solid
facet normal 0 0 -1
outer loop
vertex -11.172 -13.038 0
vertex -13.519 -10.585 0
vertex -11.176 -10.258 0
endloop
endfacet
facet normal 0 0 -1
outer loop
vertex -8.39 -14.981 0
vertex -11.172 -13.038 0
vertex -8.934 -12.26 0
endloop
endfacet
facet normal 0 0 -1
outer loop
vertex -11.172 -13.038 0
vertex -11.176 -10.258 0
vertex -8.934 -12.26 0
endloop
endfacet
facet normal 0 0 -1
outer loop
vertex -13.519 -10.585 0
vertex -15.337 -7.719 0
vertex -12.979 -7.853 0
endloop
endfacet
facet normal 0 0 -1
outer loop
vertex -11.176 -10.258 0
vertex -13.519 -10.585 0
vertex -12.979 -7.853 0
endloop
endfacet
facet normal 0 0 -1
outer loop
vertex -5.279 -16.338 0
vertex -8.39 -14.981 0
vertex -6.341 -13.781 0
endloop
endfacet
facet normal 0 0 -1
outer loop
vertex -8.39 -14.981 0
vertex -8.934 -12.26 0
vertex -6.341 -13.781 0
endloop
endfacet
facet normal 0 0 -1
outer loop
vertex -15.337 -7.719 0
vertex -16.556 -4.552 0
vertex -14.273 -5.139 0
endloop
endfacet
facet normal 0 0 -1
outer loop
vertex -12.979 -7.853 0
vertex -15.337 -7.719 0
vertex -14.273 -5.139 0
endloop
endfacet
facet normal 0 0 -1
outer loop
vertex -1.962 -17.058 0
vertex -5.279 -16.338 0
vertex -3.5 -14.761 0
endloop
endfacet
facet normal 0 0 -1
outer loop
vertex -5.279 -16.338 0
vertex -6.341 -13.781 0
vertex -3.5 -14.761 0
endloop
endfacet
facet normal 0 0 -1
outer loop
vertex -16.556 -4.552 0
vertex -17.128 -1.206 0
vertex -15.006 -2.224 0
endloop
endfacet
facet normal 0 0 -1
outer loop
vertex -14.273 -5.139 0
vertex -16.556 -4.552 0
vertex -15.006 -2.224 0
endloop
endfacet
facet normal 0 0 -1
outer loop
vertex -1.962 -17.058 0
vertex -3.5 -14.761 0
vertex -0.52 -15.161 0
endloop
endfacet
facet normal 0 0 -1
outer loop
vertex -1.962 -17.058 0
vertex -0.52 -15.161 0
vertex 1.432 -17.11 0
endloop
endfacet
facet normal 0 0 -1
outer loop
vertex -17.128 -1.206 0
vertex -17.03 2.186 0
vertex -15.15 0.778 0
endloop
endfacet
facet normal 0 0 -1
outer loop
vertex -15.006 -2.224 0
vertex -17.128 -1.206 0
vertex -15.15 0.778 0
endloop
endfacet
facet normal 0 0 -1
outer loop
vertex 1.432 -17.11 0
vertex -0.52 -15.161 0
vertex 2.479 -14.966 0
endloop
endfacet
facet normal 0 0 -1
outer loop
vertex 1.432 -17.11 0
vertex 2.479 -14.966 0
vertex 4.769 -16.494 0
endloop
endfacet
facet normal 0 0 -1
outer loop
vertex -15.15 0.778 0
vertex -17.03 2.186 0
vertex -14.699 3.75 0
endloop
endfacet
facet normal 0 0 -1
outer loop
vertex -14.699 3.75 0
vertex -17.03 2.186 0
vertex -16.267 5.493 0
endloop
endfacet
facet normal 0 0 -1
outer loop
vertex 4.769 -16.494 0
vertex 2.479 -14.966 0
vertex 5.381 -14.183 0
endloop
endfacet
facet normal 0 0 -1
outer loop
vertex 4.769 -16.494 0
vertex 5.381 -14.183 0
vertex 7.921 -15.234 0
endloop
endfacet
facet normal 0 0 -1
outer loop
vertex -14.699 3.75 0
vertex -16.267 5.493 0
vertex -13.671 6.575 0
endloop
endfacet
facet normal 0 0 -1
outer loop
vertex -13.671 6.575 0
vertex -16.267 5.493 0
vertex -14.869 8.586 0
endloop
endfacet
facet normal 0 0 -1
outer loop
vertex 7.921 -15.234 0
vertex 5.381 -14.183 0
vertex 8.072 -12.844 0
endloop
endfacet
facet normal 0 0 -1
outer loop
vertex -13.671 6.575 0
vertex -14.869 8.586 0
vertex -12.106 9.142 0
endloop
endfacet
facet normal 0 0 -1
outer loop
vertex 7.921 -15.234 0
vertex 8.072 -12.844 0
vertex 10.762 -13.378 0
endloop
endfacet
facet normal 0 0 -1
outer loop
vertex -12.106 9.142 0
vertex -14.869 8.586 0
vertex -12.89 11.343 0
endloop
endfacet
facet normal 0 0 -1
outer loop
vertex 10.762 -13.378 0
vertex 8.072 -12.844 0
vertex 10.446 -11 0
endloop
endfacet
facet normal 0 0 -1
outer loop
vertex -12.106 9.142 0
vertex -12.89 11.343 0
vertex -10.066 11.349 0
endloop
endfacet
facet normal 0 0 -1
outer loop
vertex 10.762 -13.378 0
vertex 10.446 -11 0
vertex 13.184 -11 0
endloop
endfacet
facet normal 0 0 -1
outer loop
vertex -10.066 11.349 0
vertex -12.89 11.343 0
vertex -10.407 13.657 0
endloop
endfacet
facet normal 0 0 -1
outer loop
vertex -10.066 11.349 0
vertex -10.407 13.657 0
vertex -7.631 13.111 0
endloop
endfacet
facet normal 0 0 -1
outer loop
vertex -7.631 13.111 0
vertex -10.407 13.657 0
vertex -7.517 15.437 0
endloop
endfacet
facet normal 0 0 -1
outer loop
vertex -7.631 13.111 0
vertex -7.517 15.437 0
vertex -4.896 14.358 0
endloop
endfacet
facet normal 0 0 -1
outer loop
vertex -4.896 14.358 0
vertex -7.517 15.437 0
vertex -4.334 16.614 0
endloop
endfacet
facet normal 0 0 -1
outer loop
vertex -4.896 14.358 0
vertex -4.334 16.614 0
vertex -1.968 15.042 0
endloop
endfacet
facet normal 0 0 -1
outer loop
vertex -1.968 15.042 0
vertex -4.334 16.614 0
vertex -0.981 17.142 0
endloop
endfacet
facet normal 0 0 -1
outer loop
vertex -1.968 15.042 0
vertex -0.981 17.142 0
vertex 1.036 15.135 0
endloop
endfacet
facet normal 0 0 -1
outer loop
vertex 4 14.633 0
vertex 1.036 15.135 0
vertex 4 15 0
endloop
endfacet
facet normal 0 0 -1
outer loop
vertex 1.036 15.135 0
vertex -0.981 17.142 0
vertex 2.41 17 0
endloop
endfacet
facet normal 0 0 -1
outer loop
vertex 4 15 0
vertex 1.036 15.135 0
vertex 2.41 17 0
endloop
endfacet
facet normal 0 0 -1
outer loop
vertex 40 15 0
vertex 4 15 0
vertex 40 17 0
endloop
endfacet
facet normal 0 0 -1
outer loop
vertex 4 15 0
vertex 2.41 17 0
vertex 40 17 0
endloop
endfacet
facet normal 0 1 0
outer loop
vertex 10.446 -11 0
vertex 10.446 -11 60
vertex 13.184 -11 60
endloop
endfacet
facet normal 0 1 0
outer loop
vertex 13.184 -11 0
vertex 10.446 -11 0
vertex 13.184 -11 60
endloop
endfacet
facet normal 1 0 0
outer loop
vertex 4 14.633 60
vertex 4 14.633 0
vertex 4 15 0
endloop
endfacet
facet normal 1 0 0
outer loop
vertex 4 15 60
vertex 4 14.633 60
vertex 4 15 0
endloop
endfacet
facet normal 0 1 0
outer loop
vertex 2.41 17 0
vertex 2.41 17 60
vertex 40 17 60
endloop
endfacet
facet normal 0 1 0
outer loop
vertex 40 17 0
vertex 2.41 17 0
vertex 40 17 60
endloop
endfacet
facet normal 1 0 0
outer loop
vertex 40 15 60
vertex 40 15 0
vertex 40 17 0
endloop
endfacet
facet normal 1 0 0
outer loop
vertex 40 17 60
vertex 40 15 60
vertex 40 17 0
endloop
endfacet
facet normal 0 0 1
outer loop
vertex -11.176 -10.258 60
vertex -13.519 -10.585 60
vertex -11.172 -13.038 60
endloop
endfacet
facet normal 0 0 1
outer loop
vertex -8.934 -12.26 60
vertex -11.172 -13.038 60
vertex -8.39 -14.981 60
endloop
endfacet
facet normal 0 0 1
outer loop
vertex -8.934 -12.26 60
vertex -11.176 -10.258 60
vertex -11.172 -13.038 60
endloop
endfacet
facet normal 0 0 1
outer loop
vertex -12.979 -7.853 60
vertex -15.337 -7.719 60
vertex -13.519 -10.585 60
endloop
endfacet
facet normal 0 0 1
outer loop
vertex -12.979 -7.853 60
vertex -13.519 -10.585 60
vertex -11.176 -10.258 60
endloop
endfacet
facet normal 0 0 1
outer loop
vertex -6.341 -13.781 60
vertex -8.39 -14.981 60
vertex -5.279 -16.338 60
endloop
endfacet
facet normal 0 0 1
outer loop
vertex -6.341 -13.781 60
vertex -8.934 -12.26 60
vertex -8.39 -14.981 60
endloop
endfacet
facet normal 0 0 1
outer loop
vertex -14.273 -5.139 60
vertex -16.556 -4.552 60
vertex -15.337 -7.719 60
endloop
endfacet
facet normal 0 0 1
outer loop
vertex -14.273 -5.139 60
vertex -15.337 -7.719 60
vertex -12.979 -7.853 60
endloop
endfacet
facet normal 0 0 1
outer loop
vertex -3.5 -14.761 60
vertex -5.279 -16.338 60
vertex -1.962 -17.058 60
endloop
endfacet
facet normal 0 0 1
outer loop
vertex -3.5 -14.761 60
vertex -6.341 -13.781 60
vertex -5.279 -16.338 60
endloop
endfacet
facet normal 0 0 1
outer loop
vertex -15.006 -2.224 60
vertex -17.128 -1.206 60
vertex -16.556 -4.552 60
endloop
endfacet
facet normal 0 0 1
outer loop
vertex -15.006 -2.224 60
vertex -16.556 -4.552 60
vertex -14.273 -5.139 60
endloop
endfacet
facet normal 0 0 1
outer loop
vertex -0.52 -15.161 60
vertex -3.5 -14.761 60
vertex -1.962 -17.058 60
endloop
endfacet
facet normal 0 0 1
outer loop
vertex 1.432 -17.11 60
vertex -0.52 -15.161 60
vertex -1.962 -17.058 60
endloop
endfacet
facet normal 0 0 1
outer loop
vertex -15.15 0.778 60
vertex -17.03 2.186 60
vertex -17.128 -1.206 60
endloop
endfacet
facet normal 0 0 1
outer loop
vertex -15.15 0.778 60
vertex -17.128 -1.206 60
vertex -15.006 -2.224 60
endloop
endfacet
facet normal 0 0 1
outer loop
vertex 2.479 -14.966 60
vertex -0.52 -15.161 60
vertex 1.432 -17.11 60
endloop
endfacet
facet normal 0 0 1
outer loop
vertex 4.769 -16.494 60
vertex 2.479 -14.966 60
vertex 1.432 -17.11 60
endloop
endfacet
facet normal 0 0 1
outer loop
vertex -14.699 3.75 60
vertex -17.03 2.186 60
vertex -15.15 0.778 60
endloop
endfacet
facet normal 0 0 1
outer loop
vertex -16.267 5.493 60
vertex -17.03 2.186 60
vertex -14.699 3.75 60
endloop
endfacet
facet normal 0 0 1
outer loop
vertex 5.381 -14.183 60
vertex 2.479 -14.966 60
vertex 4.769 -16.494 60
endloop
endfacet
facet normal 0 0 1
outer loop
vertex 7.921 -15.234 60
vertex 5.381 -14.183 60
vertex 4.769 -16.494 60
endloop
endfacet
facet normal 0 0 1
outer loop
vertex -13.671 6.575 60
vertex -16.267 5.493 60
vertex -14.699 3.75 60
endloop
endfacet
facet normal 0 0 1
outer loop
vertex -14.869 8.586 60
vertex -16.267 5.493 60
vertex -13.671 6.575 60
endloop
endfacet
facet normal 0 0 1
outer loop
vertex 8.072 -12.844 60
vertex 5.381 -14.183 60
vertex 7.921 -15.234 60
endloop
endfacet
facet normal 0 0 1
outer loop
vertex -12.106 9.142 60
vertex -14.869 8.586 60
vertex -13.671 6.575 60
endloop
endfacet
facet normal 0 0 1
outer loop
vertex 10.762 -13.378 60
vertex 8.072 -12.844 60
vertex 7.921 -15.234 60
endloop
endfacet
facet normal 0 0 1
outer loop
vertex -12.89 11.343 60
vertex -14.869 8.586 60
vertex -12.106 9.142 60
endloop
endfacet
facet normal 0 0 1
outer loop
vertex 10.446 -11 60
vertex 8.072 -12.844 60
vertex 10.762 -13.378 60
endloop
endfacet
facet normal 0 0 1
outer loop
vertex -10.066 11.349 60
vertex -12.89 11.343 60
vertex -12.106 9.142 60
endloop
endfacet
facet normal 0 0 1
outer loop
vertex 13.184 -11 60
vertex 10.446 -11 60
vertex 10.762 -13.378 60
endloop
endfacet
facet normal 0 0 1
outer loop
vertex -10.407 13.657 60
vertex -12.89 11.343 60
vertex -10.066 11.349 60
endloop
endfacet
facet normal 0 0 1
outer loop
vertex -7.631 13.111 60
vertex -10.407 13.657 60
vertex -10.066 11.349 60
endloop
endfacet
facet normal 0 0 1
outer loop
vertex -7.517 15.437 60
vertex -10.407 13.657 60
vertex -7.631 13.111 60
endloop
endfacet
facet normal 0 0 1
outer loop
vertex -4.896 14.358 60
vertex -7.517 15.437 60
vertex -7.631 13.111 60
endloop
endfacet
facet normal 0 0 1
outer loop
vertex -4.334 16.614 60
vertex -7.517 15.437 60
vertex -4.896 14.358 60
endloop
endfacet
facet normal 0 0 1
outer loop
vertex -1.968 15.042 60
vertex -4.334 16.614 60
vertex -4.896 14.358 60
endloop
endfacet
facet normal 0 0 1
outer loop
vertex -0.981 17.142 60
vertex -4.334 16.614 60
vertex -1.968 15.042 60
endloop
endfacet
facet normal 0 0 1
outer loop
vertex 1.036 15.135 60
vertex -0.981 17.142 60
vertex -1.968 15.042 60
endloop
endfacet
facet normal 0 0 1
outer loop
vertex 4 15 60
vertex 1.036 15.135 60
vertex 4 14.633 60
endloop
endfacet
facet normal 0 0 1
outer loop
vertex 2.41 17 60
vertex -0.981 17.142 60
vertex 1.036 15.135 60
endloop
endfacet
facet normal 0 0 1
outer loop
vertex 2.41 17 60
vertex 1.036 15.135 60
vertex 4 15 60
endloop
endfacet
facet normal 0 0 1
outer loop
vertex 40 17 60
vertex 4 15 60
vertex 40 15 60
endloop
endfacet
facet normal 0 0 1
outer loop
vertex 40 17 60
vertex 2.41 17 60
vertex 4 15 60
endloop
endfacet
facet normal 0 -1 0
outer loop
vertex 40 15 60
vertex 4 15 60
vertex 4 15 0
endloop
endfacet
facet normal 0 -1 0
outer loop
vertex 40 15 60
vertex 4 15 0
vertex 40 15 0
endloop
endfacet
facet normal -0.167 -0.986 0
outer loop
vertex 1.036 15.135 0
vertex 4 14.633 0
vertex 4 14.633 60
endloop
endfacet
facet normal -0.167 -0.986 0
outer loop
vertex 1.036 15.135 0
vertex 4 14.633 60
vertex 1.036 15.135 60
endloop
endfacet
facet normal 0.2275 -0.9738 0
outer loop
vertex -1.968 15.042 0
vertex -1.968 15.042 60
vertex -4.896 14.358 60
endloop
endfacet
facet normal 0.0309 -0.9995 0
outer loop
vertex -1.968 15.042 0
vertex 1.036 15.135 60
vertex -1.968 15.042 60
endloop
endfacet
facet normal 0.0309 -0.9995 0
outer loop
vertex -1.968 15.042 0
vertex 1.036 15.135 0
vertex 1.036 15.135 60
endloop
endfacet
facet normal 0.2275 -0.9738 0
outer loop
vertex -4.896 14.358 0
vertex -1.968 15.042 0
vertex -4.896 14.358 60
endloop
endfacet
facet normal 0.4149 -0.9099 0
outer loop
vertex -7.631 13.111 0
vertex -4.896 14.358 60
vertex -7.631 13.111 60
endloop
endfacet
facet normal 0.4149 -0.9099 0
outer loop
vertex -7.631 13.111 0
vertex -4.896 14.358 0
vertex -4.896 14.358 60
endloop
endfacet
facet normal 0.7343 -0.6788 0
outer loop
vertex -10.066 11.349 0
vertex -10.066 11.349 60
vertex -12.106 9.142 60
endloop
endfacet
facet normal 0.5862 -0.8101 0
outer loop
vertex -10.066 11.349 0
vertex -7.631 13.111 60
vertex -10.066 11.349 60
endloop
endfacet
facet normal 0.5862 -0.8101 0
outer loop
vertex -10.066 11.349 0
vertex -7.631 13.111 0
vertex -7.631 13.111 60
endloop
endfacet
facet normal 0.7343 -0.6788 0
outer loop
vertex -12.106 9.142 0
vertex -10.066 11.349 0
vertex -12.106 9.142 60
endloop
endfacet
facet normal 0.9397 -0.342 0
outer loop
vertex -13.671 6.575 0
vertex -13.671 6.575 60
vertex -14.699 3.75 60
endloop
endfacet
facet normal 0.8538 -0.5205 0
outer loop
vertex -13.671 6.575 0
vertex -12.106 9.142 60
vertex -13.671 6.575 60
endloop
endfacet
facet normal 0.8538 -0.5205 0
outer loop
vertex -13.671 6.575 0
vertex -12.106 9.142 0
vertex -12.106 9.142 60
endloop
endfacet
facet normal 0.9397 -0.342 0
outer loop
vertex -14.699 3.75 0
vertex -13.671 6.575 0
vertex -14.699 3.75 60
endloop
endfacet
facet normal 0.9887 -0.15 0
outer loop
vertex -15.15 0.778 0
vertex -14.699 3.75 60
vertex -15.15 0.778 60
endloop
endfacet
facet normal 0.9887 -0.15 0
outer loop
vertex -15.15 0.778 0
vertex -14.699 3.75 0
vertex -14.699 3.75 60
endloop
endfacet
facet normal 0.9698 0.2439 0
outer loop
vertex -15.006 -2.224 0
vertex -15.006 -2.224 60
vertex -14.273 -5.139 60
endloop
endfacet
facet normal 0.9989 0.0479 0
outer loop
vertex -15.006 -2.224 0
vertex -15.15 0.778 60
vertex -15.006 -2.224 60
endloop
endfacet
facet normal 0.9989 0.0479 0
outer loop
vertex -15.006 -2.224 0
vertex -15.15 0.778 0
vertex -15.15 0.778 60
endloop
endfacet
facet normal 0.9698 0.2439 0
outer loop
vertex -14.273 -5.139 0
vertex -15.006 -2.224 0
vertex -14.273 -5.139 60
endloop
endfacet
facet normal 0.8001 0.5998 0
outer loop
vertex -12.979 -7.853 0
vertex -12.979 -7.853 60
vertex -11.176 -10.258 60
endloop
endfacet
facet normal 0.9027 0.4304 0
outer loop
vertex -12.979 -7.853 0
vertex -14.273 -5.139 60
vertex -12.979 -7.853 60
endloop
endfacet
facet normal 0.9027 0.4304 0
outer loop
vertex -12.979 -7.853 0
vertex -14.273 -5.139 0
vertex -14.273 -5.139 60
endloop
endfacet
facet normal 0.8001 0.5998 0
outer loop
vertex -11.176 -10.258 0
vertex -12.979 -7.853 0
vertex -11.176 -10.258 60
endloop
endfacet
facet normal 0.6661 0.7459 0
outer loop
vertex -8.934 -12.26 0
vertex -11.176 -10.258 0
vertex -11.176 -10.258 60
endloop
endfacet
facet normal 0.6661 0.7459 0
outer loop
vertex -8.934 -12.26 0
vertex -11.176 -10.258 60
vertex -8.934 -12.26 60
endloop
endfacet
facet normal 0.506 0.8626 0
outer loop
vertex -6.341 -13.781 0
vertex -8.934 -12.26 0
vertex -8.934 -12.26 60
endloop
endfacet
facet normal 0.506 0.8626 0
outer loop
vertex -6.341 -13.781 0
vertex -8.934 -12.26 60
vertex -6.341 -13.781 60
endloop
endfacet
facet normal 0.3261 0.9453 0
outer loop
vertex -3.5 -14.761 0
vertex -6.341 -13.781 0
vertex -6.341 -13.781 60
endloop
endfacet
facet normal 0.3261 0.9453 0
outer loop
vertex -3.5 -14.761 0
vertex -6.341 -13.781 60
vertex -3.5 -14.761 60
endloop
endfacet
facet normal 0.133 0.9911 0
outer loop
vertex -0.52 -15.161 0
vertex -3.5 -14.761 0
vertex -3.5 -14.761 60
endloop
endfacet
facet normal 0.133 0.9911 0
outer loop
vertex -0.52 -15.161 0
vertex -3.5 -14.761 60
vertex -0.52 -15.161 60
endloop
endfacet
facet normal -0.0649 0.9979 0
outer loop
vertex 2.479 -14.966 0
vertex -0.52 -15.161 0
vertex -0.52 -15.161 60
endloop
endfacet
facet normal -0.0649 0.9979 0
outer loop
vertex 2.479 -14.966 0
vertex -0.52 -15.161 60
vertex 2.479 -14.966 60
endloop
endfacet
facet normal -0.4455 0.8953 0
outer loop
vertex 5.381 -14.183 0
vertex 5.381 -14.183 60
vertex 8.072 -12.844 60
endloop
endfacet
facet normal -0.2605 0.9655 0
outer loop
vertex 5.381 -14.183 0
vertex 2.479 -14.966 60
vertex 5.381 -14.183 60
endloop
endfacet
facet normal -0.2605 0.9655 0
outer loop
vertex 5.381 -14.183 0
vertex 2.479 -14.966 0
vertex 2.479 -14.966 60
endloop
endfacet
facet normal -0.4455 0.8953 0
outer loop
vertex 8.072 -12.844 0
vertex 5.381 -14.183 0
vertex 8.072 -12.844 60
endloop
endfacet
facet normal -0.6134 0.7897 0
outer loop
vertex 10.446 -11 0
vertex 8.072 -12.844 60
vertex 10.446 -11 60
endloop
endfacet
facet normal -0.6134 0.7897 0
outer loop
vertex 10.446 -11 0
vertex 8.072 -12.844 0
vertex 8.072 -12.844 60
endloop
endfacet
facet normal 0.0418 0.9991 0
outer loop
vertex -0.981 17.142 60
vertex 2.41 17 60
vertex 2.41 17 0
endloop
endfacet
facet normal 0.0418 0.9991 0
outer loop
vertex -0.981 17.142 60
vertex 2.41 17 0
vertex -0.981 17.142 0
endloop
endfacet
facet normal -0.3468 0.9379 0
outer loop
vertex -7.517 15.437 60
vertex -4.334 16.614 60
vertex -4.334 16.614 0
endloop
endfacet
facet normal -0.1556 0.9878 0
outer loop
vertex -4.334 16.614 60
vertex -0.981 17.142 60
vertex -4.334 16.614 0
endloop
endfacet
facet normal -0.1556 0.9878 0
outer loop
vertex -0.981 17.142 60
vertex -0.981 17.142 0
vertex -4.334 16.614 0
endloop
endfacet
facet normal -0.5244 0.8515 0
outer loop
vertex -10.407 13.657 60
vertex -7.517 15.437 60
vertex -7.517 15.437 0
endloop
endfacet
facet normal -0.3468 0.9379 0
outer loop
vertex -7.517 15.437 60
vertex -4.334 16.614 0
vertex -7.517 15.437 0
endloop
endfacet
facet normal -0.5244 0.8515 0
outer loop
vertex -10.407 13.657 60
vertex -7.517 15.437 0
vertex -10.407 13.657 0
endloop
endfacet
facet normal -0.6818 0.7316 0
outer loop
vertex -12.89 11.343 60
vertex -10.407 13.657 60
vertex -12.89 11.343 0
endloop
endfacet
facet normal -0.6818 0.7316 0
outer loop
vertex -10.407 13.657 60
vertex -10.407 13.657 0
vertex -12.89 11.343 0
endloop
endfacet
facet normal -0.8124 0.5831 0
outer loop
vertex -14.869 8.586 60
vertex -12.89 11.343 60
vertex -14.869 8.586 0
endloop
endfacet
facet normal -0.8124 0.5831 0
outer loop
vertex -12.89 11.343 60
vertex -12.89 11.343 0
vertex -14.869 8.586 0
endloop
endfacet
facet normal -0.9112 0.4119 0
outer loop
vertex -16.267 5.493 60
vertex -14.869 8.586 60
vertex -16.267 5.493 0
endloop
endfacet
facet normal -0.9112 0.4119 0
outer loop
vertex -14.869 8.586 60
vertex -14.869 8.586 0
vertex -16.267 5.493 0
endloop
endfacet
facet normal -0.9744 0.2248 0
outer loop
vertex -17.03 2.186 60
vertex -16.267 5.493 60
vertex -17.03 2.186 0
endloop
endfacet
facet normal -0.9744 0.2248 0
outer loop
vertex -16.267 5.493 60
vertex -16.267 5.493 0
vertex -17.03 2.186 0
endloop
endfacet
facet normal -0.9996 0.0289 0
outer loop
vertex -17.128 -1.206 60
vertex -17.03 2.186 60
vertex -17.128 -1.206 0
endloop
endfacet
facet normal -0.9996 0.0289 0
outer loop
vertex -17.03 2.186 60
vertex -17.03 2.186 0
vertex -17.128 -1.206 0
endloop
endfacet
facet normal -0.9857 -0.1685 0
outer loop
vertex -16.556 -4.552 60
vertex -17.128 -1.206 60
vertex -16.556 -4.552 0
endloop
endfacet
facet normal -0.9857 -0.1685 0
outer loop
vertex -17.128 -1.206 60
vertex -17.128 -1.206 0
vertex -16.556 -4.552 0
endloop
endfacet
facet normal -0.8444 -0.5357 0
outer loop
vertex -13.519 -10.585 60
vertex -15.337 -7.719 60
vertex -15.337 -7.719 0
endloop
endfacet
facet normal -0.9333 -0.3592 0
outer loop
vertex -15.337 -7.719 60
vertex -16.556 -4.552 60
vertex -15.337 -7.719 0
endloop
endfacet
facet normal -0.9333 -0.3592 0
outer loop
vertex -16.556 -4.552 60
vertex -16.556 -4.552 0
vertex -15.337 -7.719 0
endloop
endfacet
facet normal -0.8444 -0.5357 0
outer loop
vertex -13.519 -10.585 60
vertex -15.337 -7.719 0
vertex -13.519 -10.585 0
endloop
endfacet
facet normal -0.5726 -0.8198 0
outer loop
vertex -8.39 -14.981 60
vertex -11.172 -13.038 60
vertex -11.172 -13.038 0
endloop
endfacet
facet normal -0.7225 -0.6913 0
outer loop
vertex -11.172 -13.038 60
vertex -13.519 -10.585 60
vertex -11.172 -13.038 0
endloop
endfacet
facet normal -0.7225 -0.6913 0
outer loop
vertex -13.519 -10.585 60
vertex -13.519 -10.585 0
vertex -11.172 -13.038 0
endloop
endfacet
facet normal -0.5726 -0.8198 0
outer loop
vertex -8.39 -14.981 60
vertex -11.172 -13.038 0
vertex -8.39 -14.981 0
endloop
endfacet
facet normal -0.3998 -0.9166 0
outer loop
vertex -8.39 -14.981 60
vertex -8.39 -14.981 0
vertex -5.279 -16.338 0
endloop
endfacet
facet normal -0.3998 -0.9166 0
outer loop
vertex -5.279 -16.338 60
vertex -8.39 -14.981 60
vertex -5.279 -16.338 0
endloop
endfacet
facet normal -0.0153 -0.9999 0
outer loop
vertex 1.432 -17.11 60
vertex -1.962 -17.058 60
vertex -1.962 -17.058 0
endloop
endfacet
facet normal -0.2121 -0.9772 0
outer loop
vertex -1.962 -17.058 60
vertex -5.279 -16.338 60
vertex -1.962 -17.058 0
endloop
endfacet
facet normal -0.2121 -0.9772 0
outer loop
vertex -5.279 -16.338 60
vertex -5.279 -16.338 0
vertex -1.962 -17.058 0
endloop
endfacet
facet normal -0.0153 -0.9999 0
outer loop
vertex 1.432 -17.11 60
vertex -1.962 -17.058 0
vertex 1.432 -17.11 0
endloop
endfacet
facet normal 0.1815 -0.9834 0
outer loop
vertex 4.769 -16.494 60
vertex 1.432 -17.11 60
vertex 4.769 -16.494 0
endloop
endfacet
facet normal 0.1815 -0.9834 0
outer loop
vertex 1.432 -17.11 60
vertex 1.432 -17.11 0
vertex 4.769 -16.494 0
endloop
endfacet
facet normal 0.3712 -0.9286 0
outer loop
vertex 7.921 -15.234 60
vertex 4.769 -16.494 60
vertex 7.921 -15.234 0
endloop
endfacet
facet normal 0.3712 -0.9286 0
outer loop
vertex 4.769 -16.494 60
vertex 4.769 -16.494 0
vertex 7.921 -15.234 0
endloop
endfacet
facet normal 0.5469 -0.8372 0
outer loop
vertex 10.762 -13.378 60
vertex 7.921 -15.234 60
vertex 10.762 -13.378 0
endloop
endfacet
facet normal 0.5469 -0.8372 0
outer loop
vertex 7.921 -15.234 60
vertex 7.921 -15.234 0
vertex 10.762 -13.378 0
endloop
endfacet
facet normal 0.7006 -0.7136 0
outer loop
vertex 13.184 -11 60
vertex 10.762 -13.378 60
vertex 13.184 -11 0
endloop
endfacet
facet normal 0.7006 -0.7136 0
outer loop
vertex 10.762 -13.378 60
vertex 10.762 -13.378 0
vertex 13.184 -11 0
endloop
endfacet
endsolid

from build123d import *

# Parameters (mm, degrees)
BOX006_W          = 15
BOX006_H          = 26
BOX006_DEPTH      = 64
CYLINDER023_R     = 15.17
CYLINDER023_DEPTH = 64
BOX005_W          = 40
BOX005_H          = 2
BOX005_DEPTH      = 60
CYLINDER022_R     = 17.17
CYLINDER022_DEPTH = 60


with BuildPart() as cube004:
    # Box006 → Box006 (new body)
    with BuildSketch(Plane(origin=(4, -11, -2), x_dir=(1, 0, 0), z_dir=(0, 0, 1))):
        with Locations((7.5, 13)):
            Rectangle(BOX006_W, BOX006_H)
    extrude(amount=BOX006_DEPTH)


with BuildPart() as fusion002003003009:
    # Cylinder023 → Cylinder023 (new body)
    with BuildSketch(Plane.XY.offset(-2)):
        Circle(CYLINDER023_R)
    extrude(amount=CYLINDER023_DEPTH)

    # Fusion002003003009: union Cube004
    add(cube004.part)


with BuildPart() as cube003:
    # Box005 → Box005 (new body)
    with BuildSketch(Plane(origin=(0, 15, 0), x_dir=(1, 0, 0), z_dir=(0, 0, 1))):
        with Locations((20, 1)):
            Rectangle(BOX005_W, BOX005_H)
    extrude(amount=BOX005_DEPTH)


with BuildPart() as small_ctl_panel:
    # Cylinder022 → Cylinder022 (new body)
    with BuildSketch(Plane.XY):
        Circle(CYLINDER022_R)
    extrude(amount=CYLINDER022_DEPTH)

    # Fusion002003003010: union Cube003
    add(cube003.part)

    # Cut001011003002: cut Fusion002003003009
    add(fusion002003003009.part, mode=Mode.SUBTRACT)


solid = small_ctl_panel.part
